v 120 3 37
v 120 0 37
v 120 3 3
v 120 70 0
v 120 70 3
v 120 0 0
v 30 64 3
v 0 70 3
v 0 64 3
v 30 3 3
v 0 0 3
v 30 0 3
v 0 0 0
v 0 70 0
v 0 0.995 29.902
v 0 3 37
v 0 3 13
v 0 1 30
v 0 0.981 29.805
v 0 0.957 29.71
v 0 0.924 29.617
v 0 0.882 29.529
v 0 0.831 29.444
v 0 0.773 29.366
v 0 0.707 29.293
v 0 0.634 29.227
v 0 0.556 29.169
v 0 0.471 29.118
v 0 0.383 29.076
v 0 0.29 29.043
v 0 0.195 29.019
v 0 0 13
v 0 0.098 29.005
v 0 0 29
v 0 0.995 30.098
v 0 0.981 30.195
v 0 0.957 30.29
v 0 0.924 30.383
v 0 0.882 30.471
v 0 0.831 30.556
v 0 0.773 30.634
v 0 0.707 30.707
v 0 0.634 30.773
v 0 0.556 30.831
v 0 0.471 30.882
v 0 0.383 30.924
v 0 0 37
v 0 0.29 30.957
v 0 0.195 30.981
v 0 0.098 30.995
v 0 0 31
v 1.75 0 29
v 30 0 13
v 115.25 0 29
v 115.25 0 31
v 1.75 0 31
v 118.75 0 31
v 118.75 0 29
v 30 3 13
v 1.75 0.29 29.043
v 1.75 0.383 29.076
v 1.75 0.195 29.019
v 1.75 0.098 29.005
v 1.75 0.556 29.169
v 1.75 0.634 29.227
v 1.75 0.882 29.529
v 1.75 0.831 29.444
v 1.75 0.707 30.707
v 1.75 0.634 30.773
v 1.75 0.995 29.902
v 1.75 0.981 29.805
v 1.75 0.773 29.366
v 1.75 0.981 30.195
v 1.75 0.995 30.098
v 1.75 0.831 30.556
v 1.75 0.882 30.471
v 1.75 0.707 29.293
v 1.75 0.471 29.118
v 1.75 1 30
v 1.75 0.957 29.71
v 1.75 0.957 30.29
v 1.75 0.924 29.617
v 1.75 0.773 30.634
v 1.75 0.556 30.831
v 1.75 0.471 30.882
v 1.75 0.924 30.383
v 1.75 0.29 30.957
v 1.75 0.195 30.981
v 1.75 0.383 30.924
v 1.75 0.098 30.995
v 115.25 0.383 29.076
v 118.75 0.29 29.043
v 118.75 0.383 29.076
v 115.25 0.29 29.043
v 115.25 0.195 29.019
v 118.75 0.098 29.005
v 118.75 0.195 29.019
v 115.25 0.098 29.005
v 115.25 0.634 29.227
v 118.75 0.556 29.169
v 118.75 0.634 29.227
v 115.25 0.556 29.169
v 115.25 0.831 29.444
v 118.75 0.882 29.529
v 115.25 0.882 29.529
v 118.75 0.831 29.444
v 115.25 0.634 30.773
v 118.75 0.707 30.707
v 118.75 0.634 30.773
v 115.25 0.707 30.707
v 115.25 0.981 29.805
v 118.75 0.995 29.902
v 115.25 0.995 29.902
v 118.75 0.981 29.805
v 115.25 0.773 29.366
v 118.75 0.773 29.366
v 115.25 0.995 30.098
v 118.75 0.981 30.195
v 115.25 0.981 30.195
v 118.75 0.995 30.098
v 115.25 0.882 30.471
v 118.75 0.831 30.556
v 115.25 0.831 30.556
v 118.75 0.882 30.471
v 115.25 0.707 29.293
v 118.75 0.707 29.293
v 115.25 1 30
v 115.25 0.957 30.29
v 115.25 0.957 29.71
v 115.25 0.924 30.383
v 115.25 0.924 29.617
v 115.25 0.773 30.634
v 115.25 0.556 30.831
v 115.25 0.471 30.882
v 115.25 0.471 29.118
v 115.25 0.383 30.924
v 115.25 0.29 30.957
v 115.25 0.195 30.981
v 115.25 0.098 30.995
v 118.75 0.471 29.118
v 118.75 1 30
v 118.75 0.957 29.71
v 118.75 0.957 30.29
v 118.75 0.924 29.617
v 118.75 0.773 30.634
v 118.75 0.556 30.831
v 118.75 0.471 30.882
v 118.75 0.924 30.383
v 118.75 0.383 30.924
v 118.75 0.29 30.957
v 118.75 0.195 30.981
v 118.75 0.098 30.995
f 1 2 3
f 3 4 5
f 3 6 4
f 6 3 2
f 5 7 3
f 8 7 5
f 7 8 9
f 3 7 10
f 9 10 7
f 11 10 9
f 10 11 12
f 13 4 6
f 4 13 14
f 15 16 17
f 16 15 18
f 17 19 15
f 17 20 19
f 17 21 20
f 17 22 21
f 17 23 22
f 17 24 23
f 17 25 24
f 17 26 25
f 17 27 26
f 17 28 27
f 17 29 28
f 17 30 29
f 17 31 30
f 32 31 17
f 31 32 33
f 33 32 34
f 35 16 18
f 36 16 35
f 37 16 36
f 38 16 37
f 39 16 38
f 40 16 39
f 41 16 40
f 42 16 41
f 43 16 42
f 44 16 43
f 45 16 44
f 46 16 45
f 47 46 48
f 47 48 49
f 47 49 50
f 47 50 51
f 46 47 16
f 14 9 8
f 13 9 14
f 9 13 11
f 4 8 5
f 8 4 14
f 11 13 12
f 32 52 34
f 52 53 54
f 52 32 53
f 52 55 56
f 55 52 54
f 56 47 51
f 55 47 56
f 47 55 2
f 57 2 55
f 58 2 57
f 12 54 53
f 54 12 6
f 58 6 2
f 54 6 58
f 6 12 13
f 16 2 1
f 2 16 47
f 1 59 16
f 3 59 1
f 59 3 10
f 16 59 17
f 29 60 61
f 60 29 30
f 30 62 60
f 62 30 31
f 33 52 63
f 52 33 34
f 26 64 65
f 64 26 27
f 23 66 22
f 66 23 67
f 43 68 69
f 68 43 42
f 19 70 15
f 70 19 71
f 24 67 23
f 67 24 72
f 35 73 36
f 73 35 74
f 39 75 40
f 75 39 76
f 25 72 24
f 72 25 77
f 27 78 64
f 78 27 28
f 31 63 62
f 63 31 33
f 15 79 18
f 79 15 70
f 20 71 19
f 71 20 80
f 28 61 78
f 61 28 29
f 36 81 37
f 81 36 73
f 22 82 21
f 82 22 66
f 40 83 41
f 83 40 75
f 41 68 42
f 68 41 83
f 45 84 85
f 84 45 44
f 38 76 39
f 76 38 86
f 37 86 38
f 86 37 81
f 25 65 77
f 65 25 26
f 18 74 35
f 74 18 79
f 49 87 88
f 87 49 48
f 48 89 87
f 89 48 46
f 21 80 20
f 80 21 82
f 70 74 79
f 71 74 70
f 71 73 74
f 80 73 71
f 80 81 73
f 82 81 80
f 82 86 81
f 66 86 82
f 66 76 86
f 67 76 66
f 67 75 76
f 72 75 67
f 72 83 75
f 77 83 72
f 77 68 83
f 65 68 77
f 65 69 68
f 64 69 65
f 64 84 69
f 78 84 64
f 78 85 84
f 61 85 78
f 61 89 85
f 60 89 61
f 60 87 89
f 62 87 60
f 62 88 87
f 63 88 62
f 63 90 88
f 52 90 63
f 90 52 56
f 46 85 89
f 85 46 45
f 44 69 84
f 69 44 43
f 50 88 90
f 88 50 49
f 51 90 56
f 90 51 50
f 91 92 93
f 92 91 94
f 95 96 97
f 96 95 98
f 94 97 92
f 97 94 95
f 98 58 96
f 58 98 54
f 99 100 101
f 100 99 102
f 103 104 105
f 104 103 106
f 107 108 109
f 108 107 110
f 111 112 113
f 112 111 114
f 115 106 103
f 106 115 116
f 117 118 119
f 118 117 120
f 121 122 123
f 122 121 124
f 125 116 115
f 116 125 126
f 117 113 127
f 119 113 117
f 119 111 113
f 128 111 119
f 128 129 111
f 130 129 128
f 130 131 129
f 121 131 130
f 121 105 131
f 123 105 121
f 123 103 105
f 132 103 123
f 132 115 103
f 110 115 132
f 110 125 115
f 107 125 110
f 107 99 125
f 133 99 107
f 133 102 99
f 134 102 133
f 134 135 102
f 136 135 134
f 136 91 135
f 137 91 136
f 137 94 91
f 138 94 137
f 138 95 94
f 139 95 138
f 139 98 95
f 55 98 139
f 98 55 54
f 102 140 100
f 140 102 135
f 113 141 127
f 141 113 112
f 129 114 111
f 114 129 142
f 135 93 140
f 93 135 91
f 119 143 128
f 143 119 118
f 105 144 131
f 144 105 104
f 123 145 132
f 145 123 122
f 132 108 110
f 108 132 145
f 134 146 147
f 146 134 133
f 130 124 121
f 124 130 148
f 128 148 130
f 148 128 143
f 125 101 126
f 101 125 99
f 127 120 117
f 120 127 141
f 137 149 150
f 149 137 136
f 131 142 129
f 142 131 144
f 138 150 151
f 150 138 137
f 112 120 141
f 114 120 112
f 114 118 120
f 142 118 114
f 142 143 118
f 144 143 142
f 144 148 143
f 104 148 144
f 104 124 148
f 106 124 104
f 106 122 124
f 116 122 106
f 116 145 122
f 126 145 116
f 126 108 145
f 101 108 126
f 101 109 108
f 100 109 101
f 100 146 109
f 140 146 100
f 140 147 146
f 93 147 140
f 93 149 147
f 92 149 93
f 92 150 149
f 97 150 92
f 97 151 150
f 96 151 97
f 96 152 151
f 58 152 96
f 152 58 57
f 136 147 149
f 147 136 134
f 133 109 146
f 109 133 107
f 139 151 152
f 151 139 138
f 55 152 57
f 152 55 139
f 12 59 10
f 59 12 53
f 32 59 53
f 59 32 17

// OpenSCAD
// Mini horizontal gel-electrophoresis buffer tank
// Print orientation: base on XY plane, open top, builds +Z

$fn = 64;

// ---- Tank ----
tank_x = 120;      // outer length (X)
tank_y = 70;       // outer width (Y)
tank_z = 40;       // outer height (Z)
wall   = 3;        // wall thickness
floor  = 3;        // floor thickness

// ---- Platform ----
plat_len   = 60;   // platform length in X
plat_top_z = 13;   // platform top height (z = floor + 10)

// ---- Holes ----
hole_d = 2;        // electrode hole diameter
hole_y = 0;        // hole Y position
hole_z = 30;       // hole Z position

// ---- Derived ----
inner_f = tank_y - 2*wall;              // inner width (Y)
inner_h = tank_z - floor;               // inner floor height to top
eps     = 0.5;                          // cutter overshoot

difference() {
    // Tank body with solid end walls (no top face)
    union() {
        cube([tank_x, tank_y, floor]);                                          // floor
        cube([tank_x, wall, tank_z - floor]);                                  // back wall at y = 0
        cube([tank_x, wall, tank_z - floor]);                                  // front wall at y = tank_y - wall
    }

    // Raised platform, full inner width, centred in X
    translate([-tank_x/2 + plat_len/2, 0, floor])
        cube([plat_len, inner_f, plat_top_z - floor]);

    // Electrode holes through each end wall along X
    for (sx = [-1, 1])
        translate([sx > 0 ? tank_x - wall : 0, hole_y, hole_z])
            rotate([0, 90, 0])
                cylinder(d = hole_d, h = wall + eps, center = true);
}
